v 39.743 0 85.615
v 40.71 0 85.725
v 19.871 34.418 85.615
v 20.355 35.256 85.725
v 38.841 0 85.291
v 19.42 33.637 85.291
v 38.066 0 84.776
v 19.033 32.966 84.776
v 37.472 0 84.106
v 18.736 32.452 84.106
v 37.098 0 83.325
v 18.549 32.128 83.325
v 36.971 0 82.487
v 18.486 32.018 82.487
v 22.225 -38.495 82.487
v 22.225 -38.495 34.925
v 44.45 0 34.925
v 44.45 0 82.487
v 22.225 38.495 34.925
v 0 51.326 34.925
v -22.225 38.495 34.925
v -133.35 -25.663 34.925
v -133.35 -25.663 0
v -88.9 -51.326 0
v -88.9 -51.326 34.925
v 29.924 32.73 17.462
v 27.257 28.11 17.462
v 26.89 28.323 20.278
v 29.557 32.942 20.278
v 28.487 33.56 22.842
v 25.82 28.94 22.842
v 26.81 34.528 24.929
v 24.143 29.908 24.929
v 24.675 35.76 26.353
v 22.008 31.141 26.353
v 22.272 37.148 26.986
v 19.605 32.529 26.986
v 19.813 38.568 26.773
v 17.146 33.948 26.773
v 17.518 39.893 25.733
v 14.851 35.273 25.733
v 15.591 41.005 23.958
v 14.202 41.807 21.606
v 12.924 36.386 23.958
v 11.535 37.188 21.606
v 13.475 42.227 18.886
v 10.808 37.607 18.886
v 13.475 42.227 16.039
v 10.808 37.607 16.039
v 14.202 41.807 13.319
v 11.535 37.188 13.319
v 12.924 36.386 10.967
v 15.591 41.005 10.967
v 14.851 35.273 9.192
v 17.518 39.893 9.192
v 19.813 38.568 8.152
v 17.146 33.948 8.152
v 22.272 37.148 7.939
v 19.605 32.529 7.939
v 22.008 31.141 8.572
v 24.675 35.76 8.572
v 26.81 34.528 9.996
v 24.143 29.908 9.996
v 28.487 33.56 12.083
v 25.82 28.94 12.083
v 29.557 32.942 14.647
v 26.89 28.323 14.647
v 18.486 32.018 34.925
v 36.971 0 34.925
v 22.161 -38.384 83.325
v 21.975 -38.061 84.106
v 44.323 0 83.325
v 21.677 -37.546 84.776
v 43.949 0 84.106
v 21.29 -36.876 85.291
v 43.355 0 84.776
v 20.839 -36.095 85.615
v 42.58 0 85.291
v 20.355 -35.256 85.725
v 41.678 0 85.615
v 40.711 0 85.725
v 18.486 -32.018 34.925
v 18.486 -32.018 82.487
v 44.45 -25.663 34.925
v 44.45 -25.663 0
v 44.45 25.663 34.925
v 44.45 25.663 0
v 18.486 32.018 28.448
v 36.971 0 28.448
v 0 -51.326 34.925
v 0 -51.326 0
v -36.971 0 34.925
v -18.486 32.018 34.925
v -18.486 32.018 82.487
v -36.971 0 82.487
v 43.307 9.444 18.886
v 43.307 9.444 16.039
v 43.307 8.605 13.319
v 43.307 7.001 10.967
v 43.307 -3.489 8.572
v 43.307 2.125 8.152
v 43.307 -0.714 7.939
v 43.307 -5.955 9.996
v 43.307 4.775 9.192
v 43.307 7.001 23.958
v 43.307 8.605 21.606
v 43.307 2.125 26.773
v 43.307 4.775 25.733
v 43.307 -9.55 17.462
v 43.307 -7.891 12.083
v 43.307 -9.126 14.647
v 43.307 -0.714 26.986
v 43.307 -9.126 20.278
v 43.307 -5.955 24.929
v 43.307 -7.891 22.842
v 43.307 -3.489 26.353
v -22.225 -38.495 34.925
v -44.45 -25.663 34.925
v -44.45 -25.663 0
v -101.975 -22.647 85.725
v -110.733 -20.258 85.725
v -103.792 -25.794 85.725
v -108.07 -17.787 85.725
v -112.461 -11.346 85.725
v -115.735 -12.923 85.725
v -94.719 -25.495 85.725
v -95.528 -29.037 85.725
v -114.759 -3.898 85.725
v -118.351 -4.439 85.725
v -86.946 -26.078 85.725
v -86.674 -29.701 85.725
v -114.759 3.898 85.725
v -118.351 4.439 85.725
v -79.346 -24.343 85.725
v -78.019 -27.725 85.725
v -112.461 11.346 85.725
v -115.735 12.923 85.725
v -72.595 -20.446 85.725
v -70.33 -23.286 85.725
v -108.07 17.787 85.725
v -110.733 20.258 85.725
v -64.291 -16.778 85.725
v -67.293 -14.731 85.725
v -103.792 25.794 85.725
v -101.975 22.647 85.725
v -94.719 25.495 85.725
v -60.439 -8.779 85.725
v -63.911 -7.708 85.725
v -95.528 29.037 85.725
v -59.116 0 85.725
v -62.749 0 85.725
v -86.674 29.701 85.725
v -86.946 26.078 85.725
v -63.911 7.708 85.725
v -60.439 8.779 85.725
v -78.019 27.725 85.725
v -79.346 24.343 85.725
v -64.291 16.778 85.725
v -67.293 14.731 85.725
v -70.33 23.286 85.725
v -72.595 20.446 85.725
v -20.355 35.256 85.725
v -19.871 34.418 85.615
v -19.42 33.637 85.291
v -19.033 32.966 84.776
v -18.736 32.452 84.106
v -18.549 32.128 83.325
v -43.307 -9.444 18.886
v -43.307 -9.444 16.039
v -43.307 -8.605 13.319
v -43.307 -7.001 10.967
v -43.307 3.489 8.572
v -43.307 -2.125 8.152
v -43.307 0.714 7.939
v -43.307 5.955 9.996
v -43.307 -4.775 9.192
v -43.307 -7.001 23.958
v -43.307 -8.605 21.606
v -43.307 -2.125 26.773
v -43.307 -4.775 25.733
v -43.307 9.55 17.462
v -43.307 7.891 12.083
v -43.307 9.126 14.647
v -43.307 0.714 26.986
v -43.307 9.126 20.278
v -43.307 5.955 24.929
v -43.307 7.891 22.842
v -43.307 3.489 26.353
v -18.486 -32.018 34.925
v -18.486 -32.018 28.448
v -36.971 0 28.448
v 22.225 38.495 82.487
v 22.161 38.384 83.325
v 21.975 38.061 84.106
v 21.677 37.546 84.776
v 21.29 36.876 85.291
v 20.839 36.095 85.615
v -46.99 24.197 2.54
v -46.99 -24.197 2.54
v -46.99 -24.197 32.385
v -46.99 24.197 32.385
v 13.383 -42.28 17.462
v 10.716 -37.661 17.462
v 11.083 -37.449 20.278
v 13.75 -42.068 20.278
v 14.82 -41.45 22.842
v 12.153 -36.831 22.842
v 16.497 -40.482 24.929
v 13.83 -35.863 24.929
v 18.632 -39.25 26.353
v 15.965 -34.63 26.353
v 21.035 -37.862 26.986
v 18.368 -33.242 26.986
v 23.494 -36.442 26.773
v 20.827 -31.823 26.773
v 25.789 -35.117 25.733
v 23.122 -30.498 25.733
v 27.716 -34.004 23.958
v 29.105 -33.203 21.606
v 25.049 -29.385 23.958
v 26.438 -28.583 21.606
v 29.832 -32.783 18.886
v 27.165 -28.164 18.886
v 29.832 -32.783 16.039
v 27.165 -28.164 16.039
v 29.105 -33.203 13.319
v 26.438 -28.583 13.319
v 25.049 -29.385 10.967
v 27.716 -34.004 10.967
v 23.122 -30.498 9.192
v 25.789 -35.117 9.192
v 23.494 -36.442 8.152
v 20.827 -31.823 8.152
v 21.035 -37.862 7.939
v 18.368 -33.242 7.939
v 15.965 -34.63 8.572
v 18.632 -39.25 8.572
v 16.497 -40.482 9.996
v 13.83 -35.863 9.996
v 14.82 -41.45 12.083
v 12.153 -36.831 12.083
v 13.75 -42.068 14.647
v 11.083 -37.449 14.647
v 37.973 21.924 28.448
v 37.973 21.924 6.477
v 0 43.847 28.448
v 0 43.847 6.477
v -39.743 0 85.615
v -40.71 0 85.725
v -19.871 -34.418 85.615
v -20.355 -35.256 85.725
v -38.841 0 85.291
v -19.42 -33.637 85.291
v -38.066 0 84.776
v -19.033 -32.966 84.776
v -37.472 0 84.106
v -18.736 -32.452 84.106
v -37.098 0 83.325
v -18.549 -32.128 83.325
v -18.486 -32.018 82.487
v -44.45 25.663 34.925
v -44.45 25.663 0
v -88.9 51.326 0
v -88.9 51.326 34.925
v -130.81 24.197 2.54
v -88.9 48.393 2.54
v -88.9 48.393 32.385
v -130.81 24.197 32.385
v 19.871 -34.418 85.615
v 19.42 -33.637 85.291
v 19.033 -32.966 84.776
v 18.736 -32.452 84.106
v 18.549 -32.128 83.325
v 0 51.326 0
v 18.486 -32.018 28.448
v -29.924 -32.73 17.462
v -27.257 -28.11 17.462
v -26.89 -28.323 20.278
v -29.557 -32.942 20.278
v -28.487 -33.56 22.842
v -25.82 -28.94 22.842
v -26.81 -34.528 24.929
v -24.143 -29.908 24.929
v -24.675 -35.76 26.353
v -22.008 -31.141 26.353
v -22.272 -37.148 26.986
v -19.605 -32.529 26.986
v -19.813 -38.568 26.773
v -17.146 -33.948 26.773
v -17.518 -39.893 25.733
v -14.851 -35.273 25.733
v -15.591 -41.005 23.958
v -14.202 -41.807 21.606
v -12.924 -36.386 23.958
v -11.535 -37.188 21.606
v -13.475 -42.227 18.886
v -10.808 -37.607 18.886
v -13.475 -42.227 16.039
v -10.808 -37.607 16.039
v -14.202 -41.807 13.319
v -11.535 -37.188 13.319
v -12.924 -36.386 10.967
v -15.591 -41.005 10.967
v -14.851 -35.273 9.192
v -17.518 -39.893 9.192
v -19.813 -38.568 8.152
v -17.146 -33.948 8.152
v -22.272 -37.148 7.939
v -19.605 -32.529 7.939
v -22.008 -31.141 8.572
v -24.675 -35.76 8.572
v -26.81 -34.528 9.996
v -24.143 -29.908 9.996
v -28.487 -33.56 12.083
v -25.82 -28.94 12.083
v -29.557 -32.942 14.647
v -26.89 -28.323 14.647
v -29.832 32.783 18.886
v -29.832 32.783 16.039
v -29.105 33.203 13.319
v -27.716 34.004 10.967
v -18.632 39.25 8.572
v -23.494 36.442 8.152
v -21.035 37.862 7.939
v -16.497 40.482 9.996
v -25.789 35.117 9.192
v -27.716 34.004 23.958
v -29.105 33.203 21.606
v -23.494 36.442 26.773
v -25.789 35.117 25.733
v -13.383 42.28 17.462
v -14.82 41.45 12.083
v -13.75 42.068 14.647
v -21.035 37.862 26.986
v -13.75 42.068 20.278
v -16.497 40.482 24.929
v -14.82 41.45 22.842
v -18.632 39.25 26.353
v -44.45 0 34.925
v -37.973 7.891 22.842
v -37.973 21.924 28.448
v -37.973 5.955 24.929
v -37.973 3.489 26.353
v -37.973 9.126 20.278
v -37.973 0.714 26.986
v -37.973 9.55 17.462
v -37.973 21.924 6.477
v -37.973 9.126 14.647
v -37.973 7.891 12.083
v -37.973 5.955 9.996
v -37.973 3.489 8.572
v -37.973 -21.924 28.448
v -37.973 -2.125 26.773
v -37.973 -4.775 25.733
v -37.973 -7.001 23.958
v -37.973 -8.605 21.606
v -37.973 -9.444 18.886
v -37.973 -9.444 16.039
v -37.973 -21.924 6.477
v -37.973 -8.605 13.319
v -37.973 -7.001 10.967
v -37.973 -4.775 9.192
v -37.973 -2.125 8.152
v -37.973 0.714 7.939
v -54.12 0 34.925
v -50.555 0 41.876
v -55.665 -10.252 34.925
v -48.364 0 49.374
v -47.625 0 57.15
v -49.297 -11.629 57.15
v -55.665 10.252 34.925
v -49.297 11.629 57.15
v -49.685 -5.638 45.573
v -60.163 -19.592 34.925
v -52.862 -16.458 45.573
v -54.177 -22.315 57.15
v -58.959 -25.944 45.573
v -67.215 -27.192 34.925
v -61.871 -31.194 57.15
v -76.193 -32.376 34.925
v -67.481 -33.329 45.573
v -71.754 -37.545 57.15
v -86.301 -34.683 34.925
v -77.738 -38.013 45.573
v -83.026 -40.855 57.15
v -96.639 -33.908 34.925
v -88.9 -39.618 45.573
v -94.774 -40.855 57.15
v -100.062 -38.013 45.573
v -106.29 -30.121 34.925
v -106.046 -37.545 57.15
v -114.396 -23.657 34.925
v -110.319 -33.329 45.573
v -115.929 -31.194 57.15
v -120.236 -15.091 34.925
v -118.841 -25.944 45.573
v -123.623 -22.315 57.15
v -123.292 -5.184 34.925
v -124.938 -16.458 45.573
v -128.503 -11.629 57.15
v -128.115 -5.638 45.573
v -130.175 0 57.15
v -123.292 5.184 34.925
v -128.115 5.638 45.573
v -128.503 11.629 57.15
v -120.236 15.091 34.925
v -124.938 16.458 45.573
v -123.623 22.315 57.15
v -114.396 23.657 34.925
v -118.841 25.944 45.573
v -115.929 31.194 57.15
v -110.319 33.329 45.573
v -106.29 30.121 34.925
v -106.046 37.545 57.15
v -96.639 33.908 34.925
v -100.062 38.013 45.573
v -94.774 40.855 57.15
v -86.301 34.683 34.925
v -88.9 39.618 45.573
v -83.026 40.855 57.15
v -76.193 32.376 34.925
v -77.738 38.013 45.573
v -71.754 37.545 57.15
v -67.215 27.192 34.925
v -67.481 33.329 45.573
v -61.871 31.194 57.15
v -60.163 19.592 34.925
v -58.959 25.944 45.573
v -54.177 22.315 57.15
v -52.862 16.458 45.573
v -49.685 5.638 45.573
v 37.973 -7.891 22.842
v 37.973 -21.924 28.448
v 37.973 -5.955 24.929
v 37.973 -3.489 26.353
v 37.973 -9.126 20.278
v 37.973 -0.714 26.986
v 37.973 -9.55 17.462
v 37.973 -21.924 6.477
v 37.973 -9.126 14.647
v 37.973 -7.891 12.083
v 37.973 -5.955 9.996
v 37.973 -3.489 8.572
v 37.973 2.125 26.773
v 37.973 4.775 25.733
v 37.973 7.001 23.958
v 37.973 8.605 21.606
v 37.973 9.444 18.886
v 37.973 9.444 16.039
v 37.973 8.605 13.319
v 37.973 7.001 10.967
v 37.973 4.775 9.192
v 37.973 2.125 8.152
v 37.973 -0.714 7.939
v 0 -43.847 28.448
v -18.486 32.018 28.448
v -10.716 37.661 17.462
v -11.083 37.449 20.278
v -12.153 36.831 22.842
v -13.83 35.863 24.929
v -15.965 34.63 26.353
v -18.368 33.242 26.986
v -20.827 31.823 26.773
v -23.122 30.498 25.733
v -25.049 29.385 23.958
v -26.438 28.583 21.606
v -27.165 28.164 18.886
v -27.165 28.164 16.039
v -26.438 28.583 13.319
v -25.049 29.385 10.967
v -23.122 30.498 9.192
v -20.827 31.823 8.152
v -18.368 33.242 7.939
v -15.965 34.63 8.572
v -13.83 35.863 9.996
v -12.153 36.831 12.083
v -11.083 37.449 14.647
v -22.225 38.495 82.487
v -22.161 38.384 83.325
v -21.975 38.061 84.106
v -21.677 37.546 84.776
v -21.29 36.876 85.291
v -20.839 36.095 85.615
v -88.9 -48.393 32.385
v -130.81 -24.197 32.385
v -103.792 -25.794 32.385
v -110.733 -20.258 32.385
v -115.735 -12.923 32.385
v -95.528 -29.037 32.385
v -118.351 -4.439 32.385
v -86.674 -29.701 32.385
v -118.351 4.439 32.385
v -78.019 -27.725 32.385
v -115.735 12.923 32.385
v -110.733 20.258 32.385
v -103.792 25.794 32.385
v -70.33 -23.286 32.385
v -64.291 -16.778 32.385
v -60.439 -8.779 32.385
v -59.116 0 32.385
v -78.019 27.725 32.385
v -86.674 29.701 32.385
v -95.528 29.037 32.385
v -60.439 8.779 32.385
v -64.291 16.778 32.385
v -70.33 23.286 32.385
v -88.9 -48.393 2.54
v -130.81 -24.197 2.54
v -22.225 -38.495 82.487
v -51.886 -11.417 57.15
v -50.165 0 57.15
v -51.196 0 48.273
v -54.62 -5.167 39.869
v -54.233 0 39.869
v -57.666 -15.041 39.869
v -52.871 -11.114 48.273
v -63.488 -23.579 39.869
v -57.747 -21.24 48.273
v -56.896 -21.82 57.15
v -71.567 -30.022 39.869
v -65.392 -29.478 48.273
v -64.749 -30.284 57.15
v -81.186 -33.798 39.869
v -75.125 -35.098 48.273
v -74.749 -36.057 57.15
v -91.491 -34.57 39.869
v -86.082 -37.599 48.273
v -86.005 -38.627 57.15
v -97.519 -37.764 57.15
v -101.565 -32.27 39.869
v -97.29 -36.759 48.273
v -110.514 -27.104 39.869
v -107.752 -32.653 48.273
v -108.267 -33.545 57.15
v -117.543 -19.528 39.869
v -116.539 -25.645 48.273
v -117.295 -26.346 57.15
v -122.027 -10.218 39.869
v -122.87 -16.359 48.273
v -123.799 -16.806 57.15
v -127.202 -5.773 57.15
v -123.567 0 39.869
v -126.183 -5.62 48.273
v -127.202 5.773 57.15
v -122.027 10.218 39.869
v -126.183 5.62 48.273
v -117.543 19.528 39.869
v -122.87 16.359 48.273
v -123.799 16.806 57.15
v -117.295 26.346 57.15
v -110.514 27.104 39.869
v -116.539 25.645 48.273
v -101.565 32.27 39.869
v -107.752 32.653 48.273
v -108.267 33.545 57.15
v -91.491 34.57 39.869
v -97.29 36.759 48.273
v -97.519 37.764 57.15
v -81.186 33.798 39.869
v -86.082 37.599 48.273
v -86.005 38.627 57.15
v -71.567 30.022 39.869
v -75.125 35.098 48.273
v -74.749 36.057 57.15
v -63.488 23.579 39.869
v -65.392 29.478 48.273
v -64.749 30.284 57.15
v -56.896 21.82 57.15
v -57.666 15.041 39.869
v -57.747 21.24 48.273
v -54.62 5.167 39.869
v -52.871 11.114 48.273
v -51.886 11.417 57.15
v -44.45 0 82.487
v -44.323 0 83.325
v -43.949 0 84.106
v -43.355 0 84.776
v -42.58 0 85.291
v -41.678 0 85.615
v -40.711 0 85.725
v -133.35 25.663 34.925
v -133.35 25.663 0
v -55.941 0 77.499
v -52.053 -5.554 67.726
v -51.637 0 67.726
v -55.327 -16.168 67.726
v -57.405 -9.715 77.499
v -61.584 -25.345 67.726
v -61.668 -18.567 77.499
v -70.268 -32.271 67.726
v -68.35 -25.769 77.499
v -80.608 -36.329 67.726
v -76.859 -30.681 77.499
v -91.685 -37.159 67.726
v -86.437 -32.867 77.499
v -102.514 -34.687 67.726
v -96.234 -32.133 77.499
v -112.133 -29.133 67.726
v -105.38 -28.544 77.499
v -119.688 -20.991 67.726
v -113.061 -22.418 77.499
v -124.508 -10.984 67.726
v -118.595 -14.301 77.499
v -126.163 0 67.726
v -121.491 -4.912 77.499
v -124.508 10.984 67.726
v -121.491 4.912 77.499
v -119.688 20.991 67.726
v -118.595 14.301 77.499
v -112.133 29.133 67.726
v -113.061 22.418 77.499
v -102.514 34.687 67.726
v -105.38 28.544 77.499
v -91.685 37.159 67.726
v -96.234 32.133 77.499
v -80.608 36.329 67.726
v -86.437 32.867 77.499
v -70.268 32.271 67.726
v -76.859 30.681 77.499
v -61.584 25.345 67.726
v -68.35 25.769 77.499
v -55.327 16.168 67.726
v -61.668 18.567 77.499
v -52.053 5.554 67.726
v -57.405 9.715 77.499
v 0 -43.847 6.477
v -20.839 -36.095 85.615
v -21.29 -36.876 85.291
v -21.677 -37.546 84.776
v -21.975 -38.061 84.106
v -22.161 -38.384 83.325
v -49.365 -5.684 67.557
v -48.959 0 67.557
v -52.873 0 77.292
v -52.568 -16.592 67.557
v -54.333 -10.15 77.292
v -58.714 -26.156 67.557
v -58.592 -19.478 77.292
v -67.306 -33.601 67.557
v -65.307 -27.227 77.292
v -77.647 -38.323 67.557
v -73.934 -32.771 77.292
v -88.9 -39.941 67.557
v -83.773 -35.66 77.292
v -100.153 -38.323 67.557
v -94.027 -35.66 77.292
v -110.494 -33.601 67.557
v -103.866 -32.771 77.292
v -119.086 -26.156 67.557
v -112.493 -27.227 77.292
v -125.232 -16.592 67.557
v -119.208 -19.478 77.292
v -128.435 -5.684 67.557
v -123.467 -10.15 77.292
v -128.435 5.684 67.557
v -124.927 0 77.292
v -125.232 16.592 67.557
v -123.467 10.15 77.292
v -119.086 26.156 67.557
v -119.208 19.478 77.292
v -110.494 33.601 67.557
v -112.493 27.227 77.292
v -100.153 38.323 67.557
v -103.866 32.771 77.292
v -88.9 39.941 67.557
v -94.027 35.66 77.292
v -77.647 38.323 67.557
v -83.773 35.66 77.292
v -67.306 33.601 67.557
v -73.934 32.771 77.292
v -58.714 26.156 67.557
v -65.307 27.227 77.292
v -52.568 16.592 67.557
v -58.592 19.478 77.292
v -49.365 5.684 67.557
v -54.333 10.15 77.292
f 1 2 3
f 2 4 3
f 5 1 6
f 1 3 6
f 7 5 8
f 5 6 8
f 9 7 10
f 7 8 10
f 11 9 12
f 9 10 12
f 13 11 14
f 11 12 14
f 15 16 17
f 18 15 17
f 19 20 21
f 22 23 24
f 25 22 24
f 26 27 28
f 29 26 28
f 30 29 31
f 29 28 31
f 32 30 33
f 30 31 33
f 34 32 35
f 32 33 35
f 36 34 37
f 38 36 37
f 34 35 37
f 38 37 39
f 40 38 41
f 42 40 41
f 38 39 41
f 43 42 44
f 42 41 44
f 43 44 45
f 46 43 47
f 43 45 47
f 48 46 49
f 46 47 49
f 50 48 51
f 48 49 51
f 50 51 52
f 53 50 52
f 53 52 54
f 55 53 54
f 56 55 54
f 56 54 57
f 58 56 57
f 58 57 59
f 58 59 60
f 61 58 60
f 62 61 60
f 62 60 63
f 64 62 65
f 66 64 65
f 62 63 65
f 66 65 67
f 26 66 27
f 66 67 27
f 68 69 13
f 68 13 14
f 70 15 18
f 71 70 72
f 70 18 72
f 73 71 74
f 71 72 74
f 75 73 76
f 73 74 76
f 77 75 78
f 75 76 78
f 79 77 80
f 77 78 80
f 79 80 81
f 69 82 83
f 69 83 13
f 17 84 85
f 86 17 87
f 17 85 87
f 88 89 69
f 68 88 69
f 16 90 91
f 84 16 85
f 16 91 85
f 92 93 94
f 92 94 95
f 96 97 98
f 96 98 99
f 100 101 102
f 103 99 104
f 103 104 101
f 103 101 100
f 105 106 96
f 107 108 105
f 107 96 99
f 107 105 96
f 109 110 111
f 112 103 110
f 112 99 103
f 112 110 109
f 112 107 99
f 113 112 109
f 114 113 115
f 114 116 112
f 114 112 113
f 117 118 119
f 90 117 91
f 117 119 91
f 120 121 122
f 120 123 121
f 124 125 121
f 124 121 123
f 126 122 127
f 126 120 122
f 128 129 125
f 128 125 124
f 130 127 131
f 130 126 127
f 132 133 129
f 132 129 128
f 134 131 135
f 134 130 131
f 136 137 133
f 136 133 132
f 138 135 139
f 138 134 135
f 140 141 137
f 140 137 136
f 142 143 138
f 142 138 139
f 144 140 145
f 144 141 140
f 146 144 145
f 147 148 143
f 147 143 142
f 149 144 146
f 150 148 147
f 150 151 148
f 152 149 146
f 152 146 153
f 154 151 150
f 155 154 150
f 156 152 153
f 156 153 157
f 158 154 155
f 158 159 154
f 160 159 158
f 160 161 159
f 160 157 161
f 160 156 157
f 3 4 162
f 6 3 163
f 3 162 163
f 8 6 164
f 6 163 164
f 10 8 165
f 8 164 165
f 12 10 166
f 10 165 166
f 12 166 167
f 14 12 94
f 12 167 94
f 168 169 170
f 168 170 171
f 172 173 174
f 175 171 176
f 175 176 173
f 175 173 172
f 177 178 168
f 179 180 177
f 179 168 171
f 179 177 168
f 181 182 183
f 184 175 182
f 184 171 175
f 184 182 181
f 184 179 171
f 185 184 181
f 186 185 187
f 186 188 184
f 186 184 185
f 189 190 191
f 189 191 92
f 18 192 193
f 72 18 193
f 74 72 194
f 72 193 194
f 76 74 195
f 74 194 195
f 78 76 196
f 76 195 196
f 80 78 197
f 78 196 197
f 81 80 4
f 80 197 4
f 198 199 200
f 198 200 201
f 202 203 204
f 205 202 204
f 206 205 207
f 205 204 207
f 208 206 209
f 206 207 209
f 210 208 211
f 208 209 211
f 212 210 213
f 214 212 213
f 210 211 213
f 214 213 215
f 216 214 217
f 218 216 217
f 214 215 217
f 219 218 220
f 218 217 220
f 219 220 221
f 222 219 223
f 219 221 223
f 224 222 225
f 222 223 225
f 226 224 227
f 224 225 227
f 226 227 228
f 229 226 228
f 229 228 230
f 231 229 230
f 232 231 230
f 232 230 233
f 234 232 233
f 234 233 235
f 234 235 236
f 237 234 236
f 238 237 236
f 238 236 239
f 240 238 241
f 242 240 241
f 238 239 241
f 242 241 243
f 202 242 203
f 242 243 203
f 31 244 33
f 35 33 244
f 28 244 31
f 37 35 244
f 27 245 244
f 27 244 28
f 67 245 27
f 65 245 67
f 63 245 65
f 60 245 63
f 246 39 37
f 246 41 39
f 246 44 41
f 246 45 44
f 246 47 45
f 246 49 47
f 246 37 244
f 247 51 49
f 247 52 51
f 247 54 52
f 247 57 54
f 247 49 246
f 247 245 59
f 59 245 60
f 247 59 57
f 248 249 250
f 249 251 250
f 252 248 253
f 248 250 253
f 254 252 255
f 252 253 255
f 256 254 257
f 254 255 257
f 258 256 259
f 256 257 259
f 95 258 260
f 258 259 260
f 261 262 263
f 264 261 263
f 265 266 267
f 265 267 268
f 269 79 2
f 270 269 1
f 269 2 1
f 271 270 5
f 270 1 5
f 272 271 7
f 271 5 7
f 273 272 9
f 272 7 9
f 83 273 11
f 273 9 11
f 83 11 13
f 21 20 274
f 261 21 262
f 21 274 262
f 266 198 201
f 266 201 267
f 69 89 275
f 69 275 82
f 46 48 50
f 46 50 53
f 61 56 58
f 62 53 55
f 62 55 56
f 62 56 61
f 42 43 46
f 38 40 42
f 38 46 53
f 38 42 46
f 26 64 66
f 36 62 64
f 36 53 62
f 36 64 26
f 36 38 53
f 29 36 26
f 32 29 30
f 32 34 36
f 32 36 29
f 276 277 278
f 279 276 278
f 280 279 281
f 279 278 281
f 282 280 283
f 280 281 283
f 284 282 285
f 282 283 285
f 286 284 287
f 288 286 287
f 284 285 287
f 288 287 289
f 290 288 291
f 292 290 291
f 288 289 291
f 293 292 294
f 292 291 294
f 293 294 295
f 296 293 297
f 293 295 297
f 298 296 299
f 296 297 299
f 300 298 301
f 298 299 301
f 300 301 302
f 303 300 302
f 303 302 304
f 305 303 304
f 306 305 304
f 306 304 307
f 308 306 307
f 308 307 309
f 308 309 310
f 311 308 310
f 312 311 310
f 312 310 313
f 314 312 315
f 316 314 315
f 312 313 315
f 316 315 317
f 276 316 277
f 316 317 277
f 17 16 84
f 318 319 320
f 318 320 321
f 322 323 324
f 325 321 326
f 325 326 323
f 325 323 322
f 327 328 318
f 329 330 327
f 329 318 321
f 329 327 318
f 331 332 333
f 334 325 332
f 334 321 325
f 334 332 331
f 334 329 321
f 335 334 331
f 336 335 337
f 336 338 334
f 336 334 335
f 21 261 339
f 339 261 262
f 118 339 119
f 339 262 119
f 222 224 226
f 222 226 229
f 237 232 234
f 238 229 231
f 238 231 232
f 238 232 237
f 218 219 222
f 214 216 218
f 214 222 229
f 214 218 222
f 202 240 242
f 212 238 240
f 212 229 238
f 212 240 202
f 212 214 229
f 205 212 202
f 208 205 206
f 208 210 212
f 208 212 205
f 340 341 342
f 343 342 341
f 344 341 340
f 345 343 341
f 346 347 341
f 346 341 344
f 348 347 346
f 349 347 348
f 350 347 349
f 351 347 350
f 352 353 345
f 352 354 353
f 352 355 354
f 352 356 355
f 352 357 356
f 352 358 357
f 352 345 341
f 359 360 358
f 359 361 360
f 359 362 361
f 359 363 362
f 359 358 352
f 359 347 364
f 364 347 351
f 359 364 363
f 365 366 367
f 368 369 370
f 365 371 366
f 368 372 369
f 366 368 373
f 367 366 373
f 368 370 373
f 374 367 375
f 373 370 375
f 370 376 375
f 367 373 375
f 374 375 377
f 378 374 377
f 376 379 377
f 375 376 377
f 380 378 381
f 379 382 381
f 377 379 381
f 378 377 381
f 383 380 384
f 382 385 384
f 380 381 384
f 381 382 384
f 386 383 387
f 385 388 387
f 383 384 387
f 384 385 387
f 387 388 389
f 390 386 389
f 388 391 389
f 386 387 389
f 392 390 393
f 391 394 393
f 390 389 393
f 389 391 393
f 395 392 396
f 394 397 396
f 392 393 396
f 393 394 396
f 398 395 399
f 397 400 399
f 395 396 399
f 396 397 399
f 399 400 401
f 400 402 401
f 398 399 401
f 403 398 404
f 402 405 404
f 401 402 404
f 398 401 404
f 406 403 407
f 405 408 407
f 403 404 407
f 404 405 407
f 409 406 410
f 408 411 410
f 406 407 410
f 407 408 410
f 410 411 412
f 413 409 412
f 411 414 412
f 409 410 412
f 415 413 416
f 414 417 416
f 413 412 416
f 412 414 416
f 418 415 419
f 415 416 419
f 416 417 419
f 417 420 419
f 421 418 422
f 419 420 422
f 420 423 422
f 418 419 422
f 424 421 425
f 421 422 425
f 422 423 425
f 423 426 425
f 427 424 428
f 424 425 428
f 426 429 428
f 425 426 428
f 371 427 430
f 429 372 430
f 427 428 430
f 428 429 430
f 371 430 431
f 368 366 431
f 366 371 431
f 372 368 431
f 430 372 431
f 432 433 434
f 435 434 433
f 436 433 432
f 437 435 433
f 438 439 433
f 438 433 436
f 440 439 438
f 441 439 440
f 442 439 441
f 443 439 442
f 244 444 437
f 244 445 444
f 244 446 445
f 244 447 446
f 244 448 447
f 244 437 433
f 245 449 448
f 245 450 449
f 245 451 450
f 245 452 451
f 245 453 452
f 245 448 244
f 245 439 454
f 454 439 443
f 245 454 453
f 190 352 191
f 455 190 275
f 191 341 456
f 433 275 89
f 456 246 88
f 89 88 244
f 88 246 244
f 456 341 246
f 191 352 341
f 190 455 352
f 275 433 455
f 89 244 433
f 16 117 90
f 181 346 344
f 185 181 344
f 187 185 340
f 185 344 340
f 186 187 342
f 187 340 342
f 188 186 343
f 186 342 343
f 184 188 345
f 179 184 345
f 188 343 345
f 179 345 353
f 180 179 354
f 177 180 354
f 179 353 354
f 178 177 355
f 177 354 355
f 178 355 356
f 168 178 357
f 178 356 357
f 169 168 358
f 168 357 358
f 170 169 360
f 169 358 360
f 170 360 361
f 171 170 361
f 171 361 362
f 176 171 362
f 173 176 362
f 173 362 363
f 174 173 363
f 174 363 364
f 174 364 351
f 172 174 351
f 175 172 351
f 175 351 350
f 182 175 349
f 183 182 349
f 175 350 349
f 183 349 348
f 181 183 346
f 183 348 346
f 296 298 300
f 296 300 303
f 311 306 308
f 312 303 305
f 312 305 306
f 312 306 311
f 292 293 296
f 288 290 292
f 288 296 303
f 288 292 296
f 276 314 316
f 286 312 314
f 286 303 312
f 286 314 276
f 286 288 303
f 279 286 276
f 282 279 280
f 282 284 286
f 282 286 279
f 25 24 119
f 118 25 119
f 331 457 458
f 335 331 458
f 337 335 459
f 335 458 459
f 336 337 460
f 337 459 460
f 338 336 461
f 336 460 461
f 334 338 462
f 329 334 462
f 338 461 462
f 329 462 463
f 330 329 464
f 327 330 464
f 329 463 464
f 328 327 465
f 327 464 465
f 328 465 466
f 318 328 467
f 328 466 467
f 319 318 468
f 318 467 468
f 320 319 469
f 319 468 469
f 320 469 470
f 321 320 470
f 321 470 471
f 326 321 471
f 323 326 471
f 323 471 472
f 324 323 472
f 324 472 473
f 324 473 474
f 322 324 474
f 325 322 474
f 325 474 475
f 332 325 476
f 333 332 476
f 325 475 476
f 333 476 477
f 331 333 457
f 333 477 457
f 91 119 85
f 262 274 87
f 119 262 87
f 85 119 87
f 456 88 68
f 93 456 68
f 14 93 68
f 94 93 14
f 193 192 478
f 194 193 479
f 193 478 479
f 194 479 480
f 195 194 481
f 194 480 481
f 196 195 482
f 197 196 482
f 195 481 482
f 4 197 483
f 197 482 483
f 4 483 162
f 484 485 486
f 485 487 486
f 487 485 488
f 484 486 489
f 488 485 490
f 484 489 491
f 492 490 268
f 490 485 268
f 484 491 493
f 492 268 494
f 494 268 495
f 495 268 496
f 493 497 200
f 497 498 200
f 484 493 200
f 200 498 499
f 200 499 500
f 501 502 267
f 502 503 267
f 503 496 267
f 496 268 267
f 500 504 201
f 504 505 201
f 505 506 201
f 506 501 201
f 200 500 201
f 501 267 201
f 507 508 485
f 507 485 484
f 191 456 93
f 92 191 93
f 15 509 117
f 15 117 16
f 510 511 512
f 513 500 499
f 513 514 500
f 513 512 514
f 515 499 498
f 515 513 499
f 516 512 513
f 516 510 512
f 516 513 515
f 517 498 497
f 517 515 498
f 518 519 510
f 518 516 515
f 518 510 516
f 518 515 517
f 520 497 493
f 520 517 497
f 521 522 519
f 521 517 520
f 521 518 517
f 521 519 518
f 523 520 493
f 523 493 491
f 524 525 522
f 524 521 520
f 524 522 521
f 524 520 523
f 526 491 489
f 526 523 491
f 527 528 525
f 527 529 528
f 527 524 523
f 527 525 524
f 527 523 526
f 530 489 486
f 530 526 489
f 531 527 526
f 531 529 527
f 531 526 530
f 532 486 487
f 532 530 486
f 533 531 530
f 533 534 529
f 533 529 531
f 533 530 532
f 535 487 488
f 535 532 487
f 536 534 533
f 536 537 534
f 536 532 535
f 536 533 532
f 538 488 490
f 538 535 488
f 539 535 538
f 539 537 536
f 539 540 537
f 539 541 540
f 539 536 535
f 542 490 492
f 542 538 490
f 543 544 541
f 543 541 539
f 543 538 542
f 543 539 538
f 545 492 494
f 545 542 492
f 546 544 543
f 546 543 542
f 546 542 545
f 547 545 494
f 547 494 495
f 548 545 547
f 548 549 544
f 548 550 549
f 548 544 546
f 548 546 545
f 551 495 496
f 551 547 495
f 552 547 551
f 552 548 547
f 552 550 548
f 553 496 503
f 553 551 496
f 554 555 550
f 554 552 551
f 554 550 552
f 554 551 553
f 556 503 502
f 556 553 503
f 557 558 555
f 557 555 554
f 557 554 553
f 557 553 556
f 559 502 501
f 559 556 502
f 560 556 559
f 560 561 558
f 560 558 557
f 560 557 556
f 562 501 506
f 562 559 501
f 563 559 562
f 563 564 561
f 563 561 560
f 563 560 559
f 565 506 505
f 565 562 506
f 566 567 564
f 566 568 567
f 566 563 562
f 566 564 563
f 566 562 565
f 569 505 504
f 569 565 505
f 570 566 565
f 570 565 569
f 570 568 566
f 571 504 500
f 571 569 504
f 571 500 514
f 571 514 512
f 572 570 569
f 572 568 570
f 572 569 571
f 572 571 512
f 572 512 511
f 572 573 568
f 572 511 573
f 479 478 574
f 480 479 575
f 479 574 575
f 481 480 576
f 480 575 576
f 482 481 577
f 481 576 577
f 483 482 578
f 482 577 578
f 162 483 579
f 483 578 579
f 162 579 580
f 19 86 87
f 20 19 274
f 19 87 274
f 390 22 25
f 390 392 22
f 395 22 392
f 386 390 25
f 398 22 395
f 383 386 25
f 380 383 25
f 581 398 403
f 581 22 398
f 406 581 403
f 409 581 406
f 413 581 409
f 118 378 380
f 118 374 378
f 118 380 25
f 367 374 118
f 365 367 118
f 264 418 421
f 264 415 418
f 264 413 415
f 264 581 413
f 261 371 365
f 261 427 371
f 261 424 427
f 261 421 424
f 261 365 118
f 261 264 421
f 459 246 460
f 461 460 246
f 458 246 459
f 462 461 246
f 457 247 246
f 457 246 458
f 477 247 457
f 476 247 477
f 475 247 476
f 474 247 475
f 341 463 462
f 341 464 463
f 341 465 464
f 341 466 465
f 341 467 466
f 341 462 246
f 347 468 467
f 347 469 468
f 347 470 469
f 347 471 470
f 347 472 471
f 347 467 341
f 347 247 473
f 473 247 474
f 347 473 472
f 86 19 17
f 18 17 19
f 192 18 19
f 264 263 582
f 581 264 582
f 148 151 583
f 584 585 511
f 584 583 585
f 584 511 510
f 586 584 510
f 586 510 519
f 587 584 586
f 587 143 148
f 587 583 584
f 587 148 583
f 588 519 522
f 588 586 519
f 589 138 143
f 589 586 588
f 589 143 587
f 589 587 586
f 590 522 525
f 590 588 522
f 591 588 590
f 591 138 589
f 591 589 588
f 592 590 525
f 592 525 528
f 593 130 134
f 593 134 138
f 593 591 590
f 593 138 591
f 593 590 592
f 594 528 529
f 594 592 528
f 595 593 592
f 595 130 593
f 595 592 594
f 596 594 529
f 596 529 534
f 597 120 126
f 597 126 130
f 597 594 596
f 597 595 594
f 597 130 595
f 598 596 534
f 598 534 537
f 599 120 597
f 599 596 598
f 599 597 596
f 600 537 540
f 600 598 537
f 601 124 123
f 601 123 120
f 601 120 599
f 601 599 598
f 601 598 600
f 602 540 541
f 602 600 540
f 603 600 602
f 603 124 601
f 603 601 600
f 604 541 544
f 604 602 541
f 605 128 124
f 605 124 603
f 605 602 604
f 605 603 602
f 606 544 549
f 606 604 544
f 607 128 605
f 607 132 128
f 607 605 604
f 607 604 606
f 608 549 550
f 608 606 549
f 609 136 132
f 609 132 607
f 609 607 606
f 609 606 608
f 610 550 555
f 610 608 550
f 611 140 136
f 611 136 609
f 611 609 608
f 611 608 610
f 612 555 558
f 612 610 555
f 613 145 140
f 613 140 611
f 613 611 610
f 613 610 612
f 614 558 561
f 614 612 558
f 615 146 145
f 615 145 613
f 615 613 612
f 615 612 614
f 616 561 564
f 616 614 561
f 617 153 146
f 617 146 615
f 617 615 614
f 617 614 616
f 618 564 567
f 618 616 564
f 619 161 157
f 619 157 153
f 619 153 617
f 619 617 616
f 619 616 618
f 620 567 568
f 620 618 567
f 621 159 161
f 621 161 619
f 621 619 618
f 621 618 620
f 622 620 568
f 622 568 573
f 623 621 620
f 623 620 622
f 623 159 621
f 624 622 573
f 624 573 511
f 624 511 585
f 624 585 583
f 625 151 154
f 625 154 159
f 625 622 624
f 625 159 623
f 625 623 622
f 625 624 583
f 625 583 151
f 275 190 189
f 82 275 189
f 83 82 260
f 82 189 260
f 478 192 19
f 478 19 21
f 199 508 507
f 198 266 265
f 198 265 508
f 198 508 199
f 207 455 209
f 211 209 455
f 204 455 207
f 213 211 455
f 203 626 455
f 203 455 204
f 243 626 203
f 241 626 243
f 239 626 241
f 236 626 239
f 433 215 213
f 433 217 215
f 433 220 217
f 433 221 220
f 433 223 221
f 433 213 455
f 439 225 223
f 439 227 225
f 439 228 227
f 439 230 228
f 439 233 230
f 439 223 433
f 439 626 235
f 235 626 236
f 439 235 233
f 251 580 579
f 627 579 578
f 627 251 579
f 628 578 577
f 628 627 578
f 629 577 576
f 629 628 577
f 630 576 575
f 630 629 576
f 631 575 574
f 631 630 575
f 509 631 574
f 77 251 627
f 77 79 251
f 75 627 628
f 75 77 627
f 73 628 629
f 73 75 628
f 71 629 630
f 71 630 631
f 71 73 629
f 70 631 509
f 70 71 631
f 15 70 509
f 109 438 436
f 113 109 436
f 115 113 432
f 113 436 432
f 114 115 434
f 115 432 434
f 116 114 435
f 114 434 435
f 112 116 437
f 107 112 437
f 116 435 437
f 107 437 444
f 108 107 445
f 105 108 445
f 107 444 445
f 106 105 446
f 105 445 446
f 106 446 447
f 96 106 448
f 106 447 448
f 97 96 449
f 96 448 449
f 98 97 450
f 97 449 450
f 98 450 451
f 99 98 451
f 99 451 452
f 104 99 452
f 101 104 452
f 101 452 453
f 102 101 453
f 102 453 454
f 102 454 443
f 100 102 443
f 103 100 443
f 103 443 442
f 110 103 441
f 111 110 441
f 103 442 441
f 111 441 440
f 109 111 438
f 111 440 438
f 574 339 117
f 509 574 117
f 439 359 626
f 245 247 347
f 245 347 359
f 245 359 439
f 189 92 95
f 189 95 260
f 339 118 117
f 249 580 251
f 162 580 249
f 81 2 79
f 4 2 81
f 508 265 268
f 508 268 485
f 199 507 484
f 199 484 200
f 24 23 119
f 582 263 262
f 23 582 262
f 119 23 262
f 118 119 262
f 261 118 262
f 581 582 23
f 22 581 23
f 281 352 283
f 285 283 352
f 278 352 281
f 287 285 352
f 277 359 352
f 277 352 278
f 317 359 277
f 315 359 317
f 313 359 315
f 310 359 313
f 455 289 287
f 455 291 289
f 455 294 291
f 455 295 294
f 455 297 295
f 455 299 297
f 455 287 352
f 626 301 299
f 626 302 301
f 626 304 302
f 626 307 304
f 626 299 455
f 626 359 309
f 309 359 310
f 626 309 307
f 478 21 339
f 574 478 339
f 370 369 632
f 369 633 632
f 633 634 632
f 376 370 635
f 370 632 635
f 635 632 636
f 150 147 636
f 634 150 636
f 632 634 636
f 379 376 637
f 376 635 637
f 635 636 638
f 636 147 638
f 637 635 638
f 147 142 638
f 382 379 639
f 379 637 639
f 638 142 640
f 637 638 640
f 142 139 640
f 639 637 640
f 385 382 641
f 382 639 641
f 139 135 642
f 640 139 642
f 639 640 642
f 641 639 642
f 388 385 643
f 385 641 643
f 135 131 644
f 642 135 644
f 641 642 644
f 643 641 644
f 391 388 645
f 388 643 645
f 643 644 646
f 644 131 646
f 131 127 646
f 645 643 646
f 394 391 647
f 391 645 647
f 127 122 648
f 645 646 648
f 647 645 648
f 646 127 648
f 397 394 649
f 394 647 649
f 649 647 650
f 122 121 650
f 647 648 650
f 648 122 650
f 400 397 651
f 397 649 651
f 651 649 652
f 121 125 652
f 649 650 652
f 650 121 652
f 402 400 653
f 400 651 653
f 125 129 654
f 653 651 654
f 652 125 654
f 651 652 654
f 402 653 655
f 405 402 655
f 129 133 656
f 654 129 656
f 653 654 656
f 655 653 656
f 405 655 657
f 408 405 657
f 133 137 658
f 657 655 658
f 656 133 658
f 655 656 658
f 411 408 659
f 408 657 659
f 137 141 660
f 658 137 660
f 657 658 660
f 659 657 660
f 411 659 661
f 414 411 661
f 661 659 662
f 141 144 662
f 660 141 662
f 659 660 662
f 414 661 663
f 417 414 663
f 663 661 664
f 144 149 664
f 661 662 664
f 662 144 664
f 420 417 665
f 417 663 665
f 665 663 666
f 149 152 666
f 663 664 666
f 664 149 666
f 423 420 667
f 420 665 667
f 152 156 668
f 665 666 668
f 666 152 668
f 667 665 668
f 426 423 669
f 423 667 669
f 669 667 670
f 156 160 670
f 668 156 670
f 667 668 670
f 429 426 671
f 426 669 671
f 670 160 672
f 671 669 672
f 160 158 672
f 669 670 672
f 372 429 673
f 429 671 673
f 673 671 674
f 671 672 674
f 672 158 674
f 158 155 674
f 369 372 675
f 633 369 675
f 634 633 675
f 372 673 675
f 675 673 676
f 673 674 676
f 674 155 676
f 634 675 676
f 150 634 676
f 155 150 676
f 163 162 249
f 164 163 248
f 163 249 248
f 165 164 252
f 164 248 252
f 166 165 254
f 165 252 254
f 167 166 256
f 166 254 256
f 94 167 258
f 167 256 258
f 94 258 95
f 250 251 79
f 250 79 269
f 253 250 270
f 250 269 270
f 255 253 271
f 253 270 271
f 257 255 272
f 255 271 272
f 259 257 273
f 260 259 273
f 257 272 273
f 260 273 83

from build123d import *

# Parameters (mm, degrees)
F1_DEPTH        = 34.925
F3_DEPTH        = 50.8
F4_T            = 6.477
F4_T3_DEPTH     = 57.404
F4_T5_DEPTH     = 57.404
F4_T7_DEPTH     = 57.404
F4_T9_DEPTH     = 57.404
F4_T11_DEPTH    = 57.404
F5_R            = 3.23849
F6_R            = 9.5504
F7_DEPTH        = 5.334
F7_COPIES_COUNT = 6
F9_DEPTH        = 34.925
F15_T           = -2.54
F16_W           = 90.7614380121
F16_H           = 120.473433286
F17_DEPTH       = 25.4


# Not quite as in the source:
# - a fillet or chamfer is up to 0.001 mm smaller than in the source, because OpenCascade refuses the exact size
# - a pattern or mirror of a feature is missing from the dataset's text; its kind, count and spacing are read off the source's solid
# - a shell that OpenCascade refuses in one call is made with other operations: the cavity is built on its own and cut out


with BuildPart() as f1:
    # F0 (on Top) → F1 (new body)
    with BuildSketch(Plane.XY):
        Polygon((44.45, 25.6632194655), (0, 51.326438931), (-44.45, 25.6632194655), (-44.45, -25.6632194655), (0, -51.326438931), (44.45, -25.6632194655), align=None)
    extrude(amount=F1_DEPTH)

    # F2 (on face) → F3 (join)
    with BuildSketch(Plane.XY.offset(34.925)):
        Polygon((44.45, 0), (22.225, 38.4948291982), (-22.225, 38.4948291982), (-44.45, 0), (-22.225, -38.4948291982), (22.225, -38.4948291982), align=None)
    extrude(amount=F3_DEPTH)

    # F4: shell of thickness 6.477, made by hand


with BuildPart() as f4_core1:
    # F4_t2: copy of F1
    add(f1.part)

    # the walls: a layer under each face that stays
    f4_faces = [f4_core1.faces().sort_by_distance(p)[0] for p in [
        (22.225, 38.4948291982, 17.4625),
        (44.45, 0, 17.4625),
        (-22.225, 38.4948291982, 17.4625),
        (0, 0, 0),
        (40.7458333333, 19.2474145991, 34.925),
        (0, 44.9106340646, 34.925),
        (22.225, -38.4948291982, 17.4625),
        (40.7458333333, -19.2474145991, 34.925),
        (-44.45, 0, 17.4625),
        (-40.7458333333, 19.2474145991, 34.925),
        (-22.225, -38.4948291982, 17.4625),
        (33.3375, 19.2474145991, 60.325),
        (0, 38.4948291982, 60.325),
        (0, -44.9106340646, 34.925),
        (33.3375, -19.2474145991, 60.325),
        (-40.7458333333, -19.2474145991, 34.925),
        (-33.3375, 19.2474145991, 60.325),
        (0, -38.4948291982, 60.325),
        (-33.3375, -19.2474145991, 60.325),
    ]]
    thicken(f4_faces, amount=-F4_T, mode=Mode.SUBTRACT)

    # F4_s4 → F4_t3 (cut)
    with BuildSketch(Plane(origin=(14.351, -24.8566611394, 0), x_dir=(0, 0, 1), z_dir=(-0.5, 0.8660254038, 0))):
        Polygon((34.98977, 38.5595991982), (28.448, 38.4948291982), (28.448, 32.0178291982), (34.925, 32.0178291982), align=None)
    extrude(amount=F4_T3_DEPTH, mode=Mode.SUBTRACT)

    # F4_s6 → F4_t5 (cut)
    with BuildSketch(Plane.YZ.offset(-28.702)):
        Polygon((38.5595991982, 34.98977), (38.4948291982, 28.448), (32.0178291982, 28.448), (32.0178291982, 34.925), align=None)
        Polygon((-38.5595991982, 34.98977), (-38.4948291982, 28.448), (-32.0178291982, 28.448), (-32.0178291982, 34.925), align=None)
    extrude(amount=F4_T5_DEPTH, mode=Mode.SUBTRACT)

    # F4_s8 → F4_t7 (cut)
    with BuildSketch(Plane(origin=(-14.351, -24.8566611394, 0), x_dir=(0, 0, 1), z_dir=(0.5, 0.8660254038, 0))):
        Polygon((34.98977, 38.5595991982), (28.448, 38.4948291982), (28.448, 32.0178291982), (34.925, 32.0178291982), align=None)
    extrude(amount=F4_T7_DEPTH, mode=Mode.SUBTRACT)

    # F4_s10 → F4_t9 (cut)
    with BuildSketch(Plane(origin=(14.351, 24.8566611394, 0), x_dir=(0, 0, 1), z_dir=(-0.5, -0.8660254038, 0))):
        Polygon((34.98977, 38.5595991982), (28.448, 38.4948291982), (28.448, 32.0178291982), (34.925, 32.0178291982), align=None)
    extrude(amount=F4_T9_DEPTH, mode=Mode.SUBTRACT)

    # F4_s12 → F4_t11 (cut)
    with BuildSketch(Plane(origin=(-14.351, 24.8566611394, 0), x_dir=(0, 0, 1), z_dir=(0.5, -0.8660254038, 0))):
        Polygon((34.98977, 38.5595991982), (28.448, 38.4948291982), (28.448, 32.0178291982), (34.925, 32.0178291982), align=None)
    extrude(amount=F4_T11_DEPTH, mode=Mode.SUBTRACT)


with BuildPart() as f1_1:
    add(f1.part)

    # what is left inside the walls is the cavity
    f4_cavity = [f4_core1.part.solids().sort_by_distance(p)[0] for p in [
        (0, -14.615815, 6.54177),
    ]]
    add(f4_cavity, mode=Mode.SUBTRACT)

    # F5 (radius 3.2385 in the source; OpenCascade refuses exactly that, so slightly less here)
    f5_edges = [f1_1.edges().sort_by_distance(p)[0] for p in [
        (33.3375, -19.247415, 85.725),
        (0, -38.494829, 85.725),
        (33.3375, 19.247415, 85.725),
        (-33.3375, -19.247415, 85.725),
        (0, 38.494829, 85.725),
        (-33.3375, 19.247415, 85.725),
        (27.728253, -16.008915, 85.725),
        (27.728253, 16.008915, 85.725),
        (0, 32.017829, 85.725),
        (-27.728253, 16.008915, 85.725),
        (-27.728253, -16.008915, 85.725),
        (0, -32.017829, 85.725),
    ]]
    fillet(f5_edges, radius=F5_R)

    # F6 (on face) → F7 (cut)
    with BuildSketch(Plane(origin=(18.9865, -32.8855826579, 0), x_dir=(-0.8660254038, -0.5, 0), z_dir=(-0.5, 0.8660254038, 0))):
        with Locations((0, 17.4625)):
            Circle(F6_R)
    f7 = extrude(amount=-F7_DEPTH, mode=Mode.SUBTRACT)

    # F7_copies: F7 ×6 about axis
    f7_copies_axis = Axis((0, 0, 0), (0, 0, 1))
    for i in range(1, F7_COPIES_COUNT):
        add(f7.rotate(f7_copies_axis, i * 360 / F7_COPIES_COUNT), mode=Mode.SUBTRACT)


with BuildPart() as f9:
    # F8 (on Top) → F9 (new body)
    with BuildSketch(Plane.XY):
        Polygon((-44.45, -25.6632194655), (-44.45, 25.6632194655), (-88.9, 51.326438931), (-133.35, 25.6632194655), (-133.35, -25.6632194655), (-88.9, -51.326438931), align=None)
    extrude(amount=F9_DEPTH)

    # F10 (on Front) → F12 (revolve)
    with BuildSketch(Plane.XZ):
        with BuildLine():
            ThreePointArc((-88.9, 15.875), (-59.7141676065, 27.9641676065), (-47.625, 57.15))
            ThreePointArc((-47.625, 57.15), (-59.7141676065, 86.3358323935), (-88.9, 98.425))
            Line((-88.9, 98.425), (-88.9, 15.875))
        make_face()
    revolve(axis=Axis((-88.9, 0, 57.15), (0, 0, -1)))

    # F13 (on Front) → F14 (revolve, cut)
    with BuildSketch(Plane.XZ):
        with BuildLine():
            ThreePointArc((-88.9, 82.55), (-77.6746798487, 87.1996798487), (-73.025, 98.425))
            ThreePointArc((-73.025, 98.425), (-77.6746798487, 109.6503201513), (-88.9, 114.3))
            Line((-88.9, 114.3), (-88.9, 82.55))
        make_face()
    revolve(axis=Axis((-88.9, 0, 98.425), (0, 0, 1)), mode=Mode.SUBTRACT)

    # F15
    f15_openings = [f9.faces().sort_by_distance(p)[0] for p in [
        (-98.988386, 0, 86.167754),
    ]]
    offset(amount=F15_T, openings=f15_openings, kind=Kind.INTERSECTION)

    # F16 (on offset) → F17 (cut)
    with BuildSketch(Plane.XY.offset(85.725)):
        with Locations((-92.8241088986, -15.1389669627)):
            Rectangle(F16_W, F16_H)
    extrude(amount=F17_DEPTH, mode=Mode.SUBTRACT)


solid = Compound([f1_1.part, f9.part])
